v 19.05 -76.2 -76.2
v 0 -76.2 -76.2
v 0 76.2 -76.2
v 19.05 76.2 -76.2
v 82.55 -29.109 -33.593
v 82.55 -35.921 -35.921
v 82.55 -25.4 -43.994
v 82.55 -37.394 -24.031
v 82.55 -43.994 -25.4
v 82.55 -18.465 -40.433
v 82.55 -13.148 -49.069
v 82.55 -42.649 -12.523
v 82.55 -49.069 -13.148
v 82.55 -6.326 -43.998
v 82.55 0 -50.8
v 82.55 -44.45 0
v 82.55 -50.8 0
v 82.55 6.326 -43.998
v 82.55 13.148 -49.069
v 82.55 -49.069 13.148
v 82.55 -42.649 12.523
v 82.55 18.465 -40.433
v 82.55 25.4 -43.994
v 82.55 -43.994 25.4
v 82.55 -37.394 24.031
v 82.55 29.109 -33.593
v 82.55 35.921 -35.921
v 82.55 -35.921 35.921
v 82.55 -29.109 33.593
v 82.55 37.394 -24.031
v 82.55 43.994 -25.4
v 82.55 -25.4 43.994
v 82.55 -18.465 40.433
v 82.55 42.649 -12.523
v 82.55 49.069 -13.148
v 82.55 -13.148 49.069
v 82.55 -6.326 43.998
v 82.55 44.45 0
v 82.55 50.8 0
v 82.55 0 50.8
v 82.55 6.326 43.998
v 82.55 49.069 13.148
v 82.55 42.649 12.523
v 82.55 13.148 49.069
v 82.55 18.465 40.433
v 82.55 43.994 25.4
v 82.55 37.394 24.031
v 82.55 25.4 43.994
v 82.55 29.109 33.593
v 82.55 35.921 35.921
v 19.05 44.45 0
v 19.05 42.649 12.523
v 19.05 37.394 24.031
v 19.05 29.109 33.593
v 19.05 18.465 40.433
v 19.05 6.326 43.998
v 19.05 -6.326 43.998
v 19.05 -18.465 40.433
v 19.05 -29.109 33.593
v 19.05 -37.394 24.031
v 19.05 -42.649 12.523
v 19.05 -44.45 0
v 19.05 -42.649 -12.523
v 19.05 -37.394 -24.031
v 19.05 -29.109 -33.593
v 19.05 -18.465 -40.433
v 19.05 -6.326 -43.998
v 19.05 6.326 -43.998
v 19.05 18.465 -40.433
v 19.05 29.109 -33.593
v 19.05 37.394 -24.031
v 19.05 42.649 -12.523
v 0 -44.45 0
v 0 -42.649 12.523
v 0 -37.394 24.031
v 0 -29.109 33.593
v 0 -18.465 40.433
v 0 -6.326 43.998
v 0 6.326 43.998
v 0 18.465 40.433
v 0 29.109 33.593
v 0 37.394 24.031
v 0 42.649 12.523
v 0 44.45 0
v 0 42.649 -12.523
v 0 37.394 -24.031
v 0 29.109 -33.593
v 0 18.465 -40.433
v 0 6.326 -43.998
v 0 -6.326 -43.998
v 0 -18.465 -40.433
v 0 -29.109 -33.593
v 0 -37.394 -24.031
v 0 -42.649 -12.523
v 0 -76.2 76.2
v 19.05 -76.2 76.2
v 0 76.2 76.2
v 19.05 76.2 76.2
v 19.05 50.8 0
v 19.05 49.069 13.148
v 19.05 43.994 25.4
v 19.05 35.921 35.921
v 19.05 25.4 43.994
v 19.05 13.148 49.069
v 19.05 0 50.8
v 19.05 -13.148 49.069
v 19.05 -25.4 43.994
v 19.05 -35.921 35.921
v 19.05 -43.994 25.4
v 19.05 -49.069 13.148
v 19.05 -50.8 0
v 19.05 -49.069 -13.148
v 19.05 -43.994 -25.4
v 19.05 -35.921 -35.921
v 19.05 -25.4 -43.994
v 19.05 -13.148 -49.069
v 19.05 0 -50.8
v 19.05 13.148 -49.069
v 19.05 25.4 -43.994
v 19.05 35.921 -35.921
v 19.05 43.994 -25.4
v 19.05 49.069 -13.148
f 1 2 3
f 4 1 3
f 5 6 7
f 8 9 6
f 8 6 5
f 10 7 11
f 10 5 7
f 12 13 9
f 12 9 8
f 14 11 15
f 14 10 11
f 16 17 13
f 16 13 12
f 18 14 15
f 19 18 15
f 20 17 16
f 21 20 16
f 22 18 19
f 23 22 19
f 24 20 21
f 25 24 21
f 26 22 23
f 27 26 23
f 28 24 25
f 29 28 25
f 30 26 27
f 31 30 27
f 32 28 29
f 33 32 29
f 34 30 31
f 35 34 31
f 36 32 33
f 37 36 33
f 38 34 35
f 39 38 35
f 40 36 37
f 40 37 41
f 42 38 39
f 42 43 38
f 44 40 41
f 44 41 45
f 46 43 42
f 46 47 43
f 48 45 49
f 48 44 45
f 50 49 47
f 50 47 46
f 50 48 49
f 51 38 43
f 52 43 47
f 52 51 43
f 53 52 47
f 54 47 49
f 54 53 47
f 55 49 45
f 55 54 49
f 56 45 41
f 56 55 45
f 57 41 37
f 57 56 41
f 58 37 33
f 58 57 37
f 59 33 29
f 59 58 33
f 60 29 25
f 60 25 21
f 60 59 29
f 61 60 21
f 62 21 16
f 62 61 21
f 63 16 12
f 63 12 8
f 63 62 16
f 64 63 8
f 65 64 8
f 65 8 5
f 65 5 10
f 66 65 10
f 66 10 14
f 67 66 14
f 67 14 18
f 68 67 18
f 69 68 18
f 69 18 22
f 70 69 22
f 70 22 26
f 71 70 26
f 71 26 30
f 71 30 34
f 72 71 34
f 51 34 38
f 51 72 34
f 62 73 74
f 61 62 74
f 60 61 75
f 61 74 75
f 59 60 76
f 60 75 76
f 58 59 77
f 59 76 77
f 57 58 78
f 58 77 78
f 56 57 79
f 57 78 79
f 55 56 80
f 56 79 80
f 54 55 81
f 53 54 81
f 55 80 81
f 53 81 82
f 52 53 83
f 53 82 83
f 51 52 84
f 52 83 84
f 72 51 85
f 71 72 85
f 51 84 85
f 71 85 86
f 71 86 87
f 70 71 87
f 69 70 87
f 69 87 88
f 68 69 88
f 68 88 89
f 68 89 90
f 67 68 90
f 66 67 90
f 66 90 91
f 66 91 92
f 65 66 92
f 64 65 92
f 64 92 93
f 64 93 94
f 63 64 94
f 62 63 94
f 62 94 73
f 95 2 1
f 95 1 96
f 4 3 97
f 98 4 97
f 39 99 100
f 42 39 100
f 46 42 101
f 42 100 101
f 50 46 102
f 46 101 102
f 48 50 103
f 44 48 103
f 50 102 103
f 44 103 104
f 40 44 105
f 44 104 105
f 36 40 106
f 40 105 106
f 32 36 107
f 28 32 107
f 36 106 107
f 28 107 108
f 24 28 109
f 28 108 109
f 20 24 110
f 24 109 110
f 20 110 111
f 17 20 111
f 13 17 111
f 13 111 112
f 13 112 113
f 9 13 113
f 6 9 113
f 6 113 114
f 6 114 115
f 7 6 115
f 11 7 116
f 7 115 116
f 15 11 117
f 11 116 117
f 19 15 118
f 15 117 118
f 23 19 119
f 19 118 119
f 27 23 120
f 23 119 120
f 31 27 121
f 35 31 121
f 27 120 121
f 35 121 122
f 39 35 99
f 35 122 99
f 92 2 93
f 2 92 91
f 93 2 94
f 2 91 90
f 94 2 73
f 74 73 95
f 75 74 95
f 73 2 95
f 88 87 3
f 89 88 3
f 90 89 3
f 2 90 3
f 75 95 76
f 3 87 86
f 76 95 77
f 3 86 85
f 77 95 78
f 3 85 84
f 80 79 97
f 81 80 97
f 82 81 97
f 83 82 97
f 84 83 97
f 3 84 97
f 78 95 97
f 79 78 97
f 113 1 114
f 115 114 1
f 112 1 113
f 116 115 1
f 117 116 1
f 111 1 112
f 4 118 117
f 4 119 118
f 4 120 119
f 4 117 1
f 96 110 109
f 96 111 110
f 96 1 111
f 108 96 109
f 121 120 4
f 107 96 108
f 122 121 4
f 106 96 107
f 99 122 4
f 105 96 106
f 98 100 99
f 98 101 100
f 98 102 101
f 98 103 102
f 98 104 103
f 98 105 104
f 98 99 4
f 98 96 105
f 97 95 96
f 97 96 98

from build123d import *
from build123d import SkipClean  # not in build123d's __all__

# Parameters (mm, degrees)
F0_W     = 152.4
F0_H     = 152.4
F1_DEPTH = 19.05
F2_R     = 44.45
F3_DEPTH = 19.051
F4_R     = 50.8
F4_R_2   = 44.45
F5_DEPTH = 63.5


with BuildPart() as f1:
    # F0 (on Right) → F1 (new body)
    with BuildSketch(Plane.YZ):
        Rectangle(F0_W, F0_H)
    extrude(amount=F1_DEPTH)

    # F2 (on face) → F3 (cut, through all)
    with BuildSketch(Plane(origin=(0, 0, 0), x_dir=(0, -1, 0), z_dir=(-1, 0, 0))):
        Circle(F2_R)
    extrude(amount=-F3_DEPTH, mode=Mode.SUBTRACT)

    # F4 (on face) → F5 (join)
    with BuildSketch(Plane.YZ.offset(19.05)):
        Circle(F4_R)
        Circle(F4_R_2, mode=Mode.SUBTRACT)
    with SkipClean():  # cleaning this boolean's faces spoils the solid; the shape is the same uncleaned
        extrude(amount=F5_DEPTH)


solid = f1.part
